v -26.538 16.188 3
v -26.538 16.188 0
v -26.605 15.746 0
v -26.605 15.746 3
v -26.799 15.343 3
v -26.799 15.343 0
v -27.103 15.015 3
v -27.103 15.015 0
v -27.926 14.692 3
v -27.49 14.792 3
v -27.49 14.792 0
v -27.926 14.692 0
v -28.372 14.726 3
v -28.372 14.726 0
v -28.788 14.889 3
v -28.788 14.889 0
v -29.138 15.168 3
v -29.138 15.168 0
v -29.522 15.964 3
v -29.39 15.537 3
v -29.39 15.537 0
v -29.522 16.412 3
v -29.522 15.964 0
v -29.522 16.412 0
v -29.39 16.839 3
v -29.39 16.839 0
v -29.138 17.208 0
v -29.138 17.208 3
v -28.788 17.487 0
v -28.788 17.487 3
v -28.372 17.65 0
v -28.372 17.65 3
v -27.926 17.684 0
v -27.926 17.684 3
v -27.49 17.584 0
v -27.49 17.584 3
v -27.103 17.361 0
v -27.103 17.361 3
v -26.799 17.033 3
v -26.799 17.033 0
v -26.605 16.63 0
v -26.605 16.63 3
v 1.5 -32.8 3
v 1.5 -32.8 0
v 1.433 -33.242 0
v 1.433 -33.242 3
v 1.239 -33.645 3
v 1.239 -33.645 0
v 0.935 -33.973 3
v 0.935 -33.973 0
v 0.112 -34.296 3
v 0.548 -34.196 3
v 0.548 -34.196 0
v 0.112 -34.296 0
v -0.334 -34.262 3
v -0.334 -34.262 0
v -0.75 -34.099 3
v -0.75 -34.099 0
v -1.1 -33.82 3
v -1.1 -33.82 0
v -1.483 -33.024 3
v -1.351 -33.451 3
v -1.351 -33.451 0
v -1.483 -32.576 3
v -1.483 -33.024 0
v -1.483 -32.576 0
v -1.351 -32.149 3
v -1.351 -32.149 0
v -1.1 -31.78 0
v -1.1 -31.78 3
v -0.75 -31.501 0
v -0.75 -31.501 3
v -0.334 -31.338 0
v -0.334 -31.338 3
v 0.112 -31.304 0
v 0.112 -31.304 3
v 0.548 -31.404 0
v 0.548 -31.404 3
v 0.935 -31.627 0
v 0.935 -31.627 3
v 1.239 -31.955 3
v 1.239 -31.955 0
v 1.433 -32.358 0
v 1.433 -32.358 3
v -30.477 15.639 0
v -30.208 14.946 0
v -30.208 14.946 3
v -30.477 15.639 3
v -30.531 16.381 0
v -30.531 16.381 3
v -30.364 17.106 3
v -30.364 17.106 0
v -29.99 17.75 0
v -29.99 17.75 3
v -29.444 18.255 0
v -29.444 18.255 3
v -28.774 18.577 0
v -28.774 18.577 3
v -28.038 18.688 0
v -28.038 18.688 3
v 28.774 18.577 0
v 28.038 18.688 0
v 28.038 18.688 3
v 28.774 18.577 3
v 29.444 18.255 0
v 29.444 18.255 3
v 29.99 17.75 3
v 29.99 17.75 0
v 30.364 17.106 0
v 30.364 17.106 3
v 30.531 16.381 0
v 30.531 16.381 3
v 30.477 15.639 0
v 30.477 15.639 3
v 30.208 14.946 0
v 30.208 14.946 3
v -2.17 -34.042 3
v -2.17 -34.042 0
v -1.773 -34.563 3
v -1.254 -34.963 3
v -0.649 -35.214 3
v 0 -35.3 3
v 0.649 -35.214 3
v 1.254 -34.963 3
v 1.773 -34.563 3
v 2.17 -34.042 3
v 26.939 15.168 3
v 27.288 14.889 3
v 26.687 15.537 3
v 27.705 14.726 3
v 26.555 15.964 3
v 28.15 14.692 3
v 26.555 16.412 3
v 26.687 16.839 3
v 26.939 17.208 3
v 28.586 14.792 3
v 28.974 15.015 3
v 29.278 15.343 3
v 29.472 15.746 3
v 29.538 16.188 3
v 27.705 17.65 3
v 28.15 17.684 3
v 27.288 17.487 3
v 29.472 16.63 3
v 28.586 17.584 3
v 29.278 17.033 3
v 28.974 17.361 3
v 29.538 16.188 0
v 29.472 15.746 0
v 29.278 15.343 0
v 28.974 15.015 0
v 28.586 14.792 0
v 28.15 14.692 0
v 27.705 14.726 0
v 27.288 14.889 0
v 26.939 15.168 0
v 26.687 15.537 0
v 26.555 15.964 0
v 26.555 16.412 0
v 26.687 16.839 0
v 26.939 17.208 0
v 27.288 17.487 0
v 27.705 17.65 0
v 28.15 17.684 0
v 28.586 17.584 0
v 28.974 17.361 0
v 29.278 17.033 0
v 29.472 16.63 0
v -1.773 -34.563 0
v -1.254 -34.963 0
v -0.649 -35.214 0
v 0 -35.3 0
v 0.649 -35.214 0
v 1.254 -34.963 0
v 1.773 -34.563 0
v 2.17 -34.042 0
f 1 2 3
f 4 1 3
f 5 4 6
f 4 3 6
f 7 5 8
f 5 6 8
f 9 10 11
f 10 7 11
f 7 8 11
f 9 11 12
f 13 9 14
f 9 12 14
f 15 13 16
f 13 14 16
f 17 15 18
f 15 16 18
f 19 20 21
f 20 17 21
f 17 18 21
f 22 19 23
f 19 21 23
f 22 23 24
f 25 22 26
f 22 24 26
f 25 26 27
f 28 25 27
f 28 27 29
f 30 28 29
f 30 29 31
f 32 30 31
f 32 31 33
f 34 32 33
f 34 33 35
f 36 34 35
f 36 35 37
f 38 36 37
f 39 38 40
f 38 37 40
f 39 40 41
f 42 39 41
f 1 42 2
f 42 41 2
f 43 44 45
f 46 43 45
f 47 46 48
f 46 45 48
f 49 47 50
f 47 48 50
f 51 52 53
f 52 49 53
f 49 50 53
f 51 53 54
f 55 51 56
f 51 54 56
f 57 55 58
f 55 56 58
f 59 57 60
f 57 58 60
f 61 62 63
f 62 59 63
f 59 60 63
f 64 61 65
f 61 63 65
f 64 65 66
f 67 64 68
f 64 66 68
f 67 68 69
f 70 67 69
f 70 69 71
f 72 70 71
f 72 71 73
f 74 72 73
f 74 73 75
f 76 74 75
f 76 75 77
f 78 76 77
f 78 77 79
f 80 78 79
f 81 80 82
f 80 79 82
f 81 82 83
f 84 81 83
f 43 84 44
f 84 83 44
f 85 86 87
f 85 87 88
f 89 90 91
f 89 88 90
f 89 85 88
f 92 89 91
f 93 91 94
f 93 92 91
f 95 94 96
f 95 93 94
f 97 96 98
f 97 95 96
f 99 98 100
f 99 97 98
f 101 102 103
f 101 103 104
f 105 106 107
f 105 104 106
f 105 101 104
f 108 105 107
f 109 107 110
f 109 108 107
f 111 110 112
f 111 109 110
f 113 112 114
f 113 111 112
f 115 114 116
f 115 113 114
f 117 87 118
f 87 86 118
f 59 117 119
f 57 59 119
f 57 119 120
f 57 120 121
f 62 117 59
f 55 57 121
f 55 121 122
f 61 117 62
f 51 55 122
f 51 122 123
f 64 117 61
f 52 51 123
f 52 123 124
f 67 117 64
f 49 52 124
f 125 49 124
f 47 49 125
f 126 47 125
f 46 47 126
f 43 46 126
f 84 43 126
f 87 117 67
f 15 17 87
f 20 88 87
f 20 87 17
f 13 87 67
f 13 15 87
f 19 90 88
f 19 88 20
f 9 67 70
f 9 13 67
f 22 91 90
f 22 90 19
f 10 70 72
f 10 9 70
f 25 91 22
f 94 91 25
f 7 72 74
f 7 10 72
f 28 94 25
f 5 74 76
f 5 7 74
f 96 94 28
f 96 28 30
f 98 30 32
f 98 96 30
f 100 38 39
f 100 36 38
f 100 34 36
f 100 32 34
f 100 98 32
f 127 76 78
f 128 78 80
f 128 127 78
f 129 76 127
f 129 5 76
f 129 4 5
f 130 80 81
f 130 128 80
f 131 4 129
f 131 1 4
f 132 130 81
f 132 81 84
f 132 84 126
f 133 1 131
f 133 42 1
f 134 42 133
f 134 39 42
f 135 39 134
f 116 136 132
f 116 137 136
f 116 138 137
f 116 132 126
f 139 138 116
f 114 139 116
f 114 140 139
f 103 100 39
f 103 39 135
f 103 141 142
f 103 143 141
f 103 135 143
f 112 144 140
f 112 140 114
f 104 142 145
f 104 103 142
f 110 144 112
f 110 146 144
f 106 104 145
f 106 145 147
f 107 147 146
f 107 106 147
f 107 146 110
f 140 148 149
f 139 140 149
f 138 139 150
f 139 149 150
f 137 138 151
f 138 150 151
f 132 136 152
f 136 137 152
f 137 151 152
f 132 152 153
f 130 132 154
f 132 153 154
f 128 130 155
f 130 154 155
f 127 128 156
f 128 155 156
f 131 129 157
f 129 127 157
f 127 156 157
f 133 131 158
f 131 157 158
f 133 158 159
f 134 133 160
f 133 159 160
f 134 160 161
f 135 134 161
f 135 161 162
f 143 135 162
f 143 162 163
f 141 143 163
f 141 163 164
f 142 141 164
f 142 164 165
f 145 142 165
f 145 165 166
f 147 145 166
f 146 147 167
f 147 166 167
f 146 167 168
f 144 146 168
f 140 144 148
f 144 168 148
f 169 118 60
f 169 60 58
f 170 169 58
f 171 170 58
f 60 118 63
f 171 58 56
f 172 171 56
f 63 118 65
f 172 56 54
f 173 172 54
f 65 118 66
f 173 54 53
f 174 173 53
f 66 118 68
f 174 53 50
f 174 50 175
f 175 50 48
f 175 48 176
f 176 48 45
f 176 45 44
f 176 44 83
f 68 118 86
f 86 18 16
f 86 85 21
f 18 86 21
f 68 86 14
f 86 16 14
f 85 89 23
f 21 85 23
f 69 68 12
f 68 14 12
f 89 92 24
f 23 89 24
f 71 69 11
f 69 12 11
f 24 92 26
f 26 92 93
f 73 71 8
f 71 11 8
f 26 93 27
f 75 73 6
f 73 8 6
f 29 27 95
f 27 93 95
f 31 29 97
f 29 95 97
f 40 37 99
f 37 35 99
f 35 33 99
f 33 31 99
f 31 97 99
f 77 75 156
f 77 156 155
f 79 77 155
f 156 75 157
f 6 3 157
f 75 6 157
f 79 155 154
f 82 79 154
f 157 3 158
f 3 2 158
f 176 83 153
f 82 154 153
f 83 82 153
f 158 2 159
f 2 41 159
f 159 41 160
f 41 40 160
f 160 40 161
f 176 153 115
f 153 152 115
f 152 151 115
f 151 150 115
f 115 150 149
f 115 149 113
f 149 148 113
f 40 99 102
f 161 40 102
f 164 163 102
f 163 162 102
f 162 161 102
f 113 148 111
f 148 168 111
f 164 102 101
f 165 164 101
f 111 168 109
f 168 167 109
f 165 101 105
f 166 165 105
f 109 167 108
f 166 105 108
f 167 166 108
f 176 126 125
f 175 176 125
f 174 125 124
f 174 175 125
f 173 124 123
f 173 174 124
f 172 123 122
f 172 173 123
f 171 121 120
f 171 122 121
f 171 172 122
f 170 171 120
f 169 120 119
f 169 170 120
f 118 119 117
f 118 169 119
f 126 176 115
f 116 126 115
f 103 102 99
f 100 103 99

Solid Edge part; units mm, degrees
sketch "Sketch1" plane through (0, 0, 0) normal (0, 0, 1) x (1, 0, 0)
  circle A0 centre (0, -32.8) radius 1.5
  circle A1 centre (-28.0384, 16.188) radius 1.5
  circle A2 centre (28.0384, 16.188) radius 1.5
  line L0 (-30.2081, 14.9461) -> (-2.1697, -34.0419)
  line L1 (2.1697, -34.0419) -> (30.2081, 14.9461)
  line L2 (28.0384, 18.688) -> (-28.0384, 18.688)
  arc A3 (-28.0384, 18.688) -> (-30.2081, 14.9461) centre (-28.0384, 16.188) ccw
  arc A4 (-2.1697, -34.0419) -> (2.1697, -34.0419) centre (0, -32.8) ccw
  arc A5 (30.2081, 14.9461) -> (28.0384, 18.688) centre (28.0384, 16.188) ccw
extrude "Protrusion1" add sketch "Sketch1" along normal blind 3
